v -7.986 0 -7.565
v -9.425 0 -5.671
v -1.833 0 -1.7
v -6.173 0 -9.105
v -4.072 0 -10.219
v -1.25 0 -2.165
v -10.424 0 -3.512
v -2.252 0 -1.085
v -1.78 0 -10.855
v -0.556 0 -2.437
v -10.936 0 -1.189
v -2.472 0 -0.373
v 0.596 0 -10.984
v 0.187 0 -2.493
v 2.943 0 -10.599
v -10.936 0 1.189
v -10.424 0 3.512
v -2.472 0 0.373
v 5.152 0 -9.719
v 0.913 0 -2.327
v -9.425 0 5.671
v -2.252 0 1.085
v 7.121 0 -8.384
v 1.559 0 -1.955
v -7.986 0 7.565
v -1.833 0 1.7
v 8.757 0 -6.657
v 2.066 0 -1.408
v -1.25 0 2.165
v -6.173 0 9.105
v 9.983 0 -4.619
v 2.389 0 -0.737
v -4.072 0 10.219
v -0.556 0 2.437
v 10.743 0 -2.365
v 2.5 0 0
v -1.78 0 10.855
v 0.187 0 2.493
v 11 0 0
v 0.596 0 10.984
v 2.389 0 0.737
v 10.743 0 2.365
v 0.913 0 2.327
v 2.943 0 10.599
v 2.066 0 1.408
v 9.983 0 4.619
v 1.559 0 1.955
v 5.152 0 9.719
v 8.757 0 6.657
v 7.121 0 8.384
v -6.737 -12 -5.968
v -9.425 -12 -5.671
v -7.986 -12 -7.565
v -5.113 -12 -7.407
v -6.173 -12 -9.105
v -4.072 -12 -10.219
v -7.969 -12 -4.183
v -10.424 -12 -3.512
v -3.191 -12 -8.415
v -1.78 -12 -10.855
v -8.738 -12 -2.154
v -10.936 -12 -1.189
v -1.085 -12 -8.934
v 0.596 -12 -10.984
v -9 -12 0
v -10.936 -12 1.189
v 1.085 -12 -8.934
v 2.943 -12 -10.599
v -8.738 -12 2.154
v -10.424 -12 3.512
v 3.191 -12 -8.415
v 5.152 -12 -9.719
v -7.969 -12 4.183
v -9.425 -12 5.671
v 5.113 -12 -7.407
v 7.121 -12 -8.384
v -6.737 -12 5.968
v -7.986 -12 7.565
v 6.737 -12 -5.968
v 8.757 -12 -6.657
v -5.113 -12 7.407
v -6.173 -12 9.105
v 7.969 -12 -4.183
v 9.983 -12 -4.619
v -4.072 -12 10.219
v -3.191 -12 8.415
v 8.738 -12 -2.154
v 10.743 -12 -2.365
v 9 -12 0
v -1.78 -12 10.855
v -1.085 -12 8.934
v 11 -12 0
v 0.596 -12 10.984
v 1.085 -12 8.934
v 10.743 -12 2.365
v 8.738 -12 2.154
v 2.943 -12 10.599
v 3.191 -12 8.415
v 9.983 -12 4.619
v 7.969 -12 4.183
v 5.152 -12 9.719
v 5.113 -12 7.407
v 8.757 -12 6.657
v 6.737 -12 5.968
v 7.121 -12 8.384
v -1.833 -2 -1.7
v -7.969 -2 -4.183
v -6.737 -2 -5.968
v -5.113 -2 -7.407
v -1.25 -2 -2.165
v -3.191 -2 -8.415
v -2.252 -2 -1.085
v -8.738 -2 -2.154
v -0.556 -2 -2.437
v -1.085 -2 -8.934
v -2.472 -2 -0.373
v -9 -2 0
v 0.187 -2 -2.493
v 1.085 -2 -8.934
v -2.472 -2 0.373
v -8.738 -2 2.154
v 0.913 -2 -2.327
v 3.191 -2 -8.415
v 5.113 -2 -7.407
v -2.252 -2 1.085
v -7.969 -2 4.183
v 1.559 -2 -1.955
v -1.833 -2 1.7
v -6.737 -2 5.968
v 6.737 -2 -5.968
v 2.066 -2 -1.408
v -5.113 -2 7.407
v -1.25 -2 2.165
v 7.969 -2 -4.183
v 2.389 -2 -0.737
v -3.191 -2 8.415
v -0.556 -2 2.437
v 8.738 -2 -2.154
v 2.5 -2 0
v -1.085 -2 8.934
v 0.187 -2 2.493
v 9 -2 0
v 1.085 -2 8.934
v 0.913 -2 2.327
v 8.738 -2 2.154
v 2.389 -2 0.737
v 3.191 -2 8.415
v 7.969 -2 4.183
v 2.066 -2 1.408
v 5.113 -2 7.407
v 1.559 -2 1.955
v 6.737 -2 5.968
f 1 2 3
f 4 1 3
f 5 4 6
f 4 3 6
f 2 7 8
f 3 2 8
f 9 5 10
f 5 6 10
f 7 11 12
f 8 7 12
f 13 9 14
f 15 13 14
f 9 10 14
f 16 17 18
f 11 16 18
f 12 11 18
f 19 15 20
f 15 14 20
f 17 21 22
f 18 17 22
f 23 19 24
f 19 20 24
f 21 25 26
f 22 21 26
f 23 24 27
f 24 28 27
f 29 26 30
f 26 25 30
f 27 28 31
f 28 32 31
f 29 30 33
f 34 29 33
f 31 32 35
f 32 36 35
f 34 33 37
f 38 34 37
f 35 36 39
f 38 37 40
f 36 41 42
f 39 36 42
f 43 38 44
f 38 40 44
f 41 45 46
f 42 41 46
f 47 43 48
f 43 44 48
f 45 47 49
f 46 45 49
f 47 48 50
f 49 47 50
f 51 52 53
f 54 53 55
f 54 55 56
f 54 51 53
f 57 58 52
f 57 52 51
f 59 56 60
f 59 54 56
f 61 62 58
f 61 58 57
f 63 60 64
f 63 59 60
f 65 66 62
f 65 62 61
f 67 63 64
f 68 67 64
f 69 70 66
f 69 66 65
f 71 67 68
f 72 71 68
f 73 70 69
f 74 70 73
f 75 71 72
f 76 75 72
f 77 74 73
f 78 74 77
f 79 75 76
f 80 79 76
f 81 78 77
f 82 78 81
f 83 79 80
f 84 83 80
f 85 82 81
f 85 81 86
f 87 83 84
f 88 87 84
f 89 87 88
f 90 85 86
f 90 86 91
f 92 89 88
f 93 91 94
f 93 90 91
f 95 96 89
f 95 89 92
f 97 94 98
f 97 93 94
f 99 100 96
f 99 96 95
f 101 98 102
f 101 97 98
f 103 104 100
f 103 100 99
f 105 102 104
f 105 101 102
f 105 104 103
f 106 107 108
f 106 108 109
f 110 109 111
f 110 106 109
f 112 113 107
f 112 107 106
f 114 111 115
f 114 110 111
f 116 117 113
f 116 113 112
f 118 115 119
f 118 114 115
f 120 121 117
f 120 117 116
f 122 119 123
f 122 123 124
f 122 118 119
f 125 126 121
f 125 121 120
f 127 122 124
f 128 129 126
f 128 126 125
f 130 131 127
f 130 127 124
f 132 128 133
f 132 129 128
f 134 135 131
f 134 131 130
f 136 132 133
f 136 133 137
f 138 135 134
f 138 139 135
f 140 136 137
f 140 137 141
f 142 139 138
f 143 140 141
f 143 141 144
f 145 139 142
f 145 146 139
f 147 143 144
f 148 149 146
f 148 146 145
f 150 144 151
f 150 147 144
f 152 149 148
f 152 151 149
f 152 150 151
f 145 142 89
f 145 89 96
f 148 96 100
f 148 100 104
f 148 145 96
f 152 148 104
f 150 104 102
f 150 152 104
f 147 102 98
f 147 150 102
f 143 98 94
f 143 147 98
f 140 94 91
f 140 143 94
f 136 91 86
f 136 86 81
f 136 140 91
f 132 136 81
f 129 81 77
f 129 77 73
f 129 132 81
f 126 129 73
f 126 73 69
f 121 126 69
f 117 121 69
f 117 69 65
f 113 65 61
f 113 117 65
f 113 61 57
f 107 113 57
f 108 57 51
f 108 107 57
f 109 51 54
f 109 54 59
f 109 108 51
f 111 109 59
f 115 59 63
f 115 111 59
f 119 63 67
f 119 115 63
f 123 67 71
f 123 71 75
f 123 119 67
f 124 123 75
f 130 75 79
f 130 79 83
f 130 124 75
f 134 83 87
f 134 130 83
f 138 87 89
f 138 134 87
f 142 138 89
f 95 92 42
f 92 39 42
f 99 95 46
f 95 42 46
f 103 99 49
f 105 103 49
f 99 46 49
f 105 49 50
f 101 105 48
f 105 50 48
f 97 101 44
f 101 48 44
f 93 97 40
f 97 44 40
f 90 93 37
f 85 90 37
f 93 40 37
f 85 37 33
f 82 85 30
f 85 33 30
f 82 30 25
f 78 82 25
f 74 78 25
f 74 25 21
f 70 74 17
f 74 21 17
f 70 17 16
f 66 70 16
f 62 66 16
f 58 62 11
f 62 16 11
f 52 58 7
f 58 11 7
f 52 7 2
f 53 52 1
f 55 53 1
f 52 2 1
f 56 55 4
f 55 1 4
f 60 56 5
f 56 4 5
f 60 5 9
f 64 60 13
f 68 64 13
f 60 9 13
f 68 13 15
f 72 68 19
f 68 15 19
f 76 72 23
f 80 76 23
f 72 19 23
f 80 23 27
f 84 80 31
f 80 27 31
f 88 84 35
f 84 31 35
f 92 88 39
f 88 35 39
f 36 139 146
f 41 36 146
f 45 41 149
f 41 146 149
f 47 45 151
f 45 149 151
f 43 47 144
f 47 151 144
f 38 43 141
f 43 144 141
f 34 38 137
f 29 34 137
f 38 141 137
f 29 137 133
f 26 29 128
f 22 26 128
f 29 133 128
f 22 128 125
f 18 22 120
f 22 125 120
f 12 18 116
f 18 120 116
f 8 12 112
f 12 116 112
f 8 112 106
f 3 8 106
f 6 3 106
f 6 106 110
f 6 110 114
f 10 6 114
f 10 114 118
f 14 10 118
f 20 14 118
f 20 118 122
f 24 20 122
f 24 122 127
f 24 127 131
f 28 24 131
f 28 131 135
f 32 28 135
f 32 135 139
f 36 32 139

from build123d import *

# Parameters (mm, degrees)
F0_R     = 11
F1_DEPTH = 2
F2_R     = 2.5
F3_DEPTH = 25
F4_R     = 11
F4_R_2   = 9
F5_DEPTH = 10


with BuildPart() as f1:
    # F0 (on Front) → F1 (new body)
    with BuildSketch(Plane.XZ):
        Circle(F0_R)
    extrude(amount=F1_DEPTH)

    # F2 (on face) → F3 (cut)
    with BuildSketch(Plane.XZ.offset(2)):
        Circle(F2_R)
    extrude(amount=-F3_DEPTH, mode=Mode.SUBTRACT)

    # F4 (on face) → F5 (join)
    with BuildSketch(Plane.XZ.offset(2)):
        Circle(F4_R)
        Circle(F4_R_2, mode=Mode.SUBTRACT)
    extrude(amount=F5_DEPTH)


solid = f1.part
